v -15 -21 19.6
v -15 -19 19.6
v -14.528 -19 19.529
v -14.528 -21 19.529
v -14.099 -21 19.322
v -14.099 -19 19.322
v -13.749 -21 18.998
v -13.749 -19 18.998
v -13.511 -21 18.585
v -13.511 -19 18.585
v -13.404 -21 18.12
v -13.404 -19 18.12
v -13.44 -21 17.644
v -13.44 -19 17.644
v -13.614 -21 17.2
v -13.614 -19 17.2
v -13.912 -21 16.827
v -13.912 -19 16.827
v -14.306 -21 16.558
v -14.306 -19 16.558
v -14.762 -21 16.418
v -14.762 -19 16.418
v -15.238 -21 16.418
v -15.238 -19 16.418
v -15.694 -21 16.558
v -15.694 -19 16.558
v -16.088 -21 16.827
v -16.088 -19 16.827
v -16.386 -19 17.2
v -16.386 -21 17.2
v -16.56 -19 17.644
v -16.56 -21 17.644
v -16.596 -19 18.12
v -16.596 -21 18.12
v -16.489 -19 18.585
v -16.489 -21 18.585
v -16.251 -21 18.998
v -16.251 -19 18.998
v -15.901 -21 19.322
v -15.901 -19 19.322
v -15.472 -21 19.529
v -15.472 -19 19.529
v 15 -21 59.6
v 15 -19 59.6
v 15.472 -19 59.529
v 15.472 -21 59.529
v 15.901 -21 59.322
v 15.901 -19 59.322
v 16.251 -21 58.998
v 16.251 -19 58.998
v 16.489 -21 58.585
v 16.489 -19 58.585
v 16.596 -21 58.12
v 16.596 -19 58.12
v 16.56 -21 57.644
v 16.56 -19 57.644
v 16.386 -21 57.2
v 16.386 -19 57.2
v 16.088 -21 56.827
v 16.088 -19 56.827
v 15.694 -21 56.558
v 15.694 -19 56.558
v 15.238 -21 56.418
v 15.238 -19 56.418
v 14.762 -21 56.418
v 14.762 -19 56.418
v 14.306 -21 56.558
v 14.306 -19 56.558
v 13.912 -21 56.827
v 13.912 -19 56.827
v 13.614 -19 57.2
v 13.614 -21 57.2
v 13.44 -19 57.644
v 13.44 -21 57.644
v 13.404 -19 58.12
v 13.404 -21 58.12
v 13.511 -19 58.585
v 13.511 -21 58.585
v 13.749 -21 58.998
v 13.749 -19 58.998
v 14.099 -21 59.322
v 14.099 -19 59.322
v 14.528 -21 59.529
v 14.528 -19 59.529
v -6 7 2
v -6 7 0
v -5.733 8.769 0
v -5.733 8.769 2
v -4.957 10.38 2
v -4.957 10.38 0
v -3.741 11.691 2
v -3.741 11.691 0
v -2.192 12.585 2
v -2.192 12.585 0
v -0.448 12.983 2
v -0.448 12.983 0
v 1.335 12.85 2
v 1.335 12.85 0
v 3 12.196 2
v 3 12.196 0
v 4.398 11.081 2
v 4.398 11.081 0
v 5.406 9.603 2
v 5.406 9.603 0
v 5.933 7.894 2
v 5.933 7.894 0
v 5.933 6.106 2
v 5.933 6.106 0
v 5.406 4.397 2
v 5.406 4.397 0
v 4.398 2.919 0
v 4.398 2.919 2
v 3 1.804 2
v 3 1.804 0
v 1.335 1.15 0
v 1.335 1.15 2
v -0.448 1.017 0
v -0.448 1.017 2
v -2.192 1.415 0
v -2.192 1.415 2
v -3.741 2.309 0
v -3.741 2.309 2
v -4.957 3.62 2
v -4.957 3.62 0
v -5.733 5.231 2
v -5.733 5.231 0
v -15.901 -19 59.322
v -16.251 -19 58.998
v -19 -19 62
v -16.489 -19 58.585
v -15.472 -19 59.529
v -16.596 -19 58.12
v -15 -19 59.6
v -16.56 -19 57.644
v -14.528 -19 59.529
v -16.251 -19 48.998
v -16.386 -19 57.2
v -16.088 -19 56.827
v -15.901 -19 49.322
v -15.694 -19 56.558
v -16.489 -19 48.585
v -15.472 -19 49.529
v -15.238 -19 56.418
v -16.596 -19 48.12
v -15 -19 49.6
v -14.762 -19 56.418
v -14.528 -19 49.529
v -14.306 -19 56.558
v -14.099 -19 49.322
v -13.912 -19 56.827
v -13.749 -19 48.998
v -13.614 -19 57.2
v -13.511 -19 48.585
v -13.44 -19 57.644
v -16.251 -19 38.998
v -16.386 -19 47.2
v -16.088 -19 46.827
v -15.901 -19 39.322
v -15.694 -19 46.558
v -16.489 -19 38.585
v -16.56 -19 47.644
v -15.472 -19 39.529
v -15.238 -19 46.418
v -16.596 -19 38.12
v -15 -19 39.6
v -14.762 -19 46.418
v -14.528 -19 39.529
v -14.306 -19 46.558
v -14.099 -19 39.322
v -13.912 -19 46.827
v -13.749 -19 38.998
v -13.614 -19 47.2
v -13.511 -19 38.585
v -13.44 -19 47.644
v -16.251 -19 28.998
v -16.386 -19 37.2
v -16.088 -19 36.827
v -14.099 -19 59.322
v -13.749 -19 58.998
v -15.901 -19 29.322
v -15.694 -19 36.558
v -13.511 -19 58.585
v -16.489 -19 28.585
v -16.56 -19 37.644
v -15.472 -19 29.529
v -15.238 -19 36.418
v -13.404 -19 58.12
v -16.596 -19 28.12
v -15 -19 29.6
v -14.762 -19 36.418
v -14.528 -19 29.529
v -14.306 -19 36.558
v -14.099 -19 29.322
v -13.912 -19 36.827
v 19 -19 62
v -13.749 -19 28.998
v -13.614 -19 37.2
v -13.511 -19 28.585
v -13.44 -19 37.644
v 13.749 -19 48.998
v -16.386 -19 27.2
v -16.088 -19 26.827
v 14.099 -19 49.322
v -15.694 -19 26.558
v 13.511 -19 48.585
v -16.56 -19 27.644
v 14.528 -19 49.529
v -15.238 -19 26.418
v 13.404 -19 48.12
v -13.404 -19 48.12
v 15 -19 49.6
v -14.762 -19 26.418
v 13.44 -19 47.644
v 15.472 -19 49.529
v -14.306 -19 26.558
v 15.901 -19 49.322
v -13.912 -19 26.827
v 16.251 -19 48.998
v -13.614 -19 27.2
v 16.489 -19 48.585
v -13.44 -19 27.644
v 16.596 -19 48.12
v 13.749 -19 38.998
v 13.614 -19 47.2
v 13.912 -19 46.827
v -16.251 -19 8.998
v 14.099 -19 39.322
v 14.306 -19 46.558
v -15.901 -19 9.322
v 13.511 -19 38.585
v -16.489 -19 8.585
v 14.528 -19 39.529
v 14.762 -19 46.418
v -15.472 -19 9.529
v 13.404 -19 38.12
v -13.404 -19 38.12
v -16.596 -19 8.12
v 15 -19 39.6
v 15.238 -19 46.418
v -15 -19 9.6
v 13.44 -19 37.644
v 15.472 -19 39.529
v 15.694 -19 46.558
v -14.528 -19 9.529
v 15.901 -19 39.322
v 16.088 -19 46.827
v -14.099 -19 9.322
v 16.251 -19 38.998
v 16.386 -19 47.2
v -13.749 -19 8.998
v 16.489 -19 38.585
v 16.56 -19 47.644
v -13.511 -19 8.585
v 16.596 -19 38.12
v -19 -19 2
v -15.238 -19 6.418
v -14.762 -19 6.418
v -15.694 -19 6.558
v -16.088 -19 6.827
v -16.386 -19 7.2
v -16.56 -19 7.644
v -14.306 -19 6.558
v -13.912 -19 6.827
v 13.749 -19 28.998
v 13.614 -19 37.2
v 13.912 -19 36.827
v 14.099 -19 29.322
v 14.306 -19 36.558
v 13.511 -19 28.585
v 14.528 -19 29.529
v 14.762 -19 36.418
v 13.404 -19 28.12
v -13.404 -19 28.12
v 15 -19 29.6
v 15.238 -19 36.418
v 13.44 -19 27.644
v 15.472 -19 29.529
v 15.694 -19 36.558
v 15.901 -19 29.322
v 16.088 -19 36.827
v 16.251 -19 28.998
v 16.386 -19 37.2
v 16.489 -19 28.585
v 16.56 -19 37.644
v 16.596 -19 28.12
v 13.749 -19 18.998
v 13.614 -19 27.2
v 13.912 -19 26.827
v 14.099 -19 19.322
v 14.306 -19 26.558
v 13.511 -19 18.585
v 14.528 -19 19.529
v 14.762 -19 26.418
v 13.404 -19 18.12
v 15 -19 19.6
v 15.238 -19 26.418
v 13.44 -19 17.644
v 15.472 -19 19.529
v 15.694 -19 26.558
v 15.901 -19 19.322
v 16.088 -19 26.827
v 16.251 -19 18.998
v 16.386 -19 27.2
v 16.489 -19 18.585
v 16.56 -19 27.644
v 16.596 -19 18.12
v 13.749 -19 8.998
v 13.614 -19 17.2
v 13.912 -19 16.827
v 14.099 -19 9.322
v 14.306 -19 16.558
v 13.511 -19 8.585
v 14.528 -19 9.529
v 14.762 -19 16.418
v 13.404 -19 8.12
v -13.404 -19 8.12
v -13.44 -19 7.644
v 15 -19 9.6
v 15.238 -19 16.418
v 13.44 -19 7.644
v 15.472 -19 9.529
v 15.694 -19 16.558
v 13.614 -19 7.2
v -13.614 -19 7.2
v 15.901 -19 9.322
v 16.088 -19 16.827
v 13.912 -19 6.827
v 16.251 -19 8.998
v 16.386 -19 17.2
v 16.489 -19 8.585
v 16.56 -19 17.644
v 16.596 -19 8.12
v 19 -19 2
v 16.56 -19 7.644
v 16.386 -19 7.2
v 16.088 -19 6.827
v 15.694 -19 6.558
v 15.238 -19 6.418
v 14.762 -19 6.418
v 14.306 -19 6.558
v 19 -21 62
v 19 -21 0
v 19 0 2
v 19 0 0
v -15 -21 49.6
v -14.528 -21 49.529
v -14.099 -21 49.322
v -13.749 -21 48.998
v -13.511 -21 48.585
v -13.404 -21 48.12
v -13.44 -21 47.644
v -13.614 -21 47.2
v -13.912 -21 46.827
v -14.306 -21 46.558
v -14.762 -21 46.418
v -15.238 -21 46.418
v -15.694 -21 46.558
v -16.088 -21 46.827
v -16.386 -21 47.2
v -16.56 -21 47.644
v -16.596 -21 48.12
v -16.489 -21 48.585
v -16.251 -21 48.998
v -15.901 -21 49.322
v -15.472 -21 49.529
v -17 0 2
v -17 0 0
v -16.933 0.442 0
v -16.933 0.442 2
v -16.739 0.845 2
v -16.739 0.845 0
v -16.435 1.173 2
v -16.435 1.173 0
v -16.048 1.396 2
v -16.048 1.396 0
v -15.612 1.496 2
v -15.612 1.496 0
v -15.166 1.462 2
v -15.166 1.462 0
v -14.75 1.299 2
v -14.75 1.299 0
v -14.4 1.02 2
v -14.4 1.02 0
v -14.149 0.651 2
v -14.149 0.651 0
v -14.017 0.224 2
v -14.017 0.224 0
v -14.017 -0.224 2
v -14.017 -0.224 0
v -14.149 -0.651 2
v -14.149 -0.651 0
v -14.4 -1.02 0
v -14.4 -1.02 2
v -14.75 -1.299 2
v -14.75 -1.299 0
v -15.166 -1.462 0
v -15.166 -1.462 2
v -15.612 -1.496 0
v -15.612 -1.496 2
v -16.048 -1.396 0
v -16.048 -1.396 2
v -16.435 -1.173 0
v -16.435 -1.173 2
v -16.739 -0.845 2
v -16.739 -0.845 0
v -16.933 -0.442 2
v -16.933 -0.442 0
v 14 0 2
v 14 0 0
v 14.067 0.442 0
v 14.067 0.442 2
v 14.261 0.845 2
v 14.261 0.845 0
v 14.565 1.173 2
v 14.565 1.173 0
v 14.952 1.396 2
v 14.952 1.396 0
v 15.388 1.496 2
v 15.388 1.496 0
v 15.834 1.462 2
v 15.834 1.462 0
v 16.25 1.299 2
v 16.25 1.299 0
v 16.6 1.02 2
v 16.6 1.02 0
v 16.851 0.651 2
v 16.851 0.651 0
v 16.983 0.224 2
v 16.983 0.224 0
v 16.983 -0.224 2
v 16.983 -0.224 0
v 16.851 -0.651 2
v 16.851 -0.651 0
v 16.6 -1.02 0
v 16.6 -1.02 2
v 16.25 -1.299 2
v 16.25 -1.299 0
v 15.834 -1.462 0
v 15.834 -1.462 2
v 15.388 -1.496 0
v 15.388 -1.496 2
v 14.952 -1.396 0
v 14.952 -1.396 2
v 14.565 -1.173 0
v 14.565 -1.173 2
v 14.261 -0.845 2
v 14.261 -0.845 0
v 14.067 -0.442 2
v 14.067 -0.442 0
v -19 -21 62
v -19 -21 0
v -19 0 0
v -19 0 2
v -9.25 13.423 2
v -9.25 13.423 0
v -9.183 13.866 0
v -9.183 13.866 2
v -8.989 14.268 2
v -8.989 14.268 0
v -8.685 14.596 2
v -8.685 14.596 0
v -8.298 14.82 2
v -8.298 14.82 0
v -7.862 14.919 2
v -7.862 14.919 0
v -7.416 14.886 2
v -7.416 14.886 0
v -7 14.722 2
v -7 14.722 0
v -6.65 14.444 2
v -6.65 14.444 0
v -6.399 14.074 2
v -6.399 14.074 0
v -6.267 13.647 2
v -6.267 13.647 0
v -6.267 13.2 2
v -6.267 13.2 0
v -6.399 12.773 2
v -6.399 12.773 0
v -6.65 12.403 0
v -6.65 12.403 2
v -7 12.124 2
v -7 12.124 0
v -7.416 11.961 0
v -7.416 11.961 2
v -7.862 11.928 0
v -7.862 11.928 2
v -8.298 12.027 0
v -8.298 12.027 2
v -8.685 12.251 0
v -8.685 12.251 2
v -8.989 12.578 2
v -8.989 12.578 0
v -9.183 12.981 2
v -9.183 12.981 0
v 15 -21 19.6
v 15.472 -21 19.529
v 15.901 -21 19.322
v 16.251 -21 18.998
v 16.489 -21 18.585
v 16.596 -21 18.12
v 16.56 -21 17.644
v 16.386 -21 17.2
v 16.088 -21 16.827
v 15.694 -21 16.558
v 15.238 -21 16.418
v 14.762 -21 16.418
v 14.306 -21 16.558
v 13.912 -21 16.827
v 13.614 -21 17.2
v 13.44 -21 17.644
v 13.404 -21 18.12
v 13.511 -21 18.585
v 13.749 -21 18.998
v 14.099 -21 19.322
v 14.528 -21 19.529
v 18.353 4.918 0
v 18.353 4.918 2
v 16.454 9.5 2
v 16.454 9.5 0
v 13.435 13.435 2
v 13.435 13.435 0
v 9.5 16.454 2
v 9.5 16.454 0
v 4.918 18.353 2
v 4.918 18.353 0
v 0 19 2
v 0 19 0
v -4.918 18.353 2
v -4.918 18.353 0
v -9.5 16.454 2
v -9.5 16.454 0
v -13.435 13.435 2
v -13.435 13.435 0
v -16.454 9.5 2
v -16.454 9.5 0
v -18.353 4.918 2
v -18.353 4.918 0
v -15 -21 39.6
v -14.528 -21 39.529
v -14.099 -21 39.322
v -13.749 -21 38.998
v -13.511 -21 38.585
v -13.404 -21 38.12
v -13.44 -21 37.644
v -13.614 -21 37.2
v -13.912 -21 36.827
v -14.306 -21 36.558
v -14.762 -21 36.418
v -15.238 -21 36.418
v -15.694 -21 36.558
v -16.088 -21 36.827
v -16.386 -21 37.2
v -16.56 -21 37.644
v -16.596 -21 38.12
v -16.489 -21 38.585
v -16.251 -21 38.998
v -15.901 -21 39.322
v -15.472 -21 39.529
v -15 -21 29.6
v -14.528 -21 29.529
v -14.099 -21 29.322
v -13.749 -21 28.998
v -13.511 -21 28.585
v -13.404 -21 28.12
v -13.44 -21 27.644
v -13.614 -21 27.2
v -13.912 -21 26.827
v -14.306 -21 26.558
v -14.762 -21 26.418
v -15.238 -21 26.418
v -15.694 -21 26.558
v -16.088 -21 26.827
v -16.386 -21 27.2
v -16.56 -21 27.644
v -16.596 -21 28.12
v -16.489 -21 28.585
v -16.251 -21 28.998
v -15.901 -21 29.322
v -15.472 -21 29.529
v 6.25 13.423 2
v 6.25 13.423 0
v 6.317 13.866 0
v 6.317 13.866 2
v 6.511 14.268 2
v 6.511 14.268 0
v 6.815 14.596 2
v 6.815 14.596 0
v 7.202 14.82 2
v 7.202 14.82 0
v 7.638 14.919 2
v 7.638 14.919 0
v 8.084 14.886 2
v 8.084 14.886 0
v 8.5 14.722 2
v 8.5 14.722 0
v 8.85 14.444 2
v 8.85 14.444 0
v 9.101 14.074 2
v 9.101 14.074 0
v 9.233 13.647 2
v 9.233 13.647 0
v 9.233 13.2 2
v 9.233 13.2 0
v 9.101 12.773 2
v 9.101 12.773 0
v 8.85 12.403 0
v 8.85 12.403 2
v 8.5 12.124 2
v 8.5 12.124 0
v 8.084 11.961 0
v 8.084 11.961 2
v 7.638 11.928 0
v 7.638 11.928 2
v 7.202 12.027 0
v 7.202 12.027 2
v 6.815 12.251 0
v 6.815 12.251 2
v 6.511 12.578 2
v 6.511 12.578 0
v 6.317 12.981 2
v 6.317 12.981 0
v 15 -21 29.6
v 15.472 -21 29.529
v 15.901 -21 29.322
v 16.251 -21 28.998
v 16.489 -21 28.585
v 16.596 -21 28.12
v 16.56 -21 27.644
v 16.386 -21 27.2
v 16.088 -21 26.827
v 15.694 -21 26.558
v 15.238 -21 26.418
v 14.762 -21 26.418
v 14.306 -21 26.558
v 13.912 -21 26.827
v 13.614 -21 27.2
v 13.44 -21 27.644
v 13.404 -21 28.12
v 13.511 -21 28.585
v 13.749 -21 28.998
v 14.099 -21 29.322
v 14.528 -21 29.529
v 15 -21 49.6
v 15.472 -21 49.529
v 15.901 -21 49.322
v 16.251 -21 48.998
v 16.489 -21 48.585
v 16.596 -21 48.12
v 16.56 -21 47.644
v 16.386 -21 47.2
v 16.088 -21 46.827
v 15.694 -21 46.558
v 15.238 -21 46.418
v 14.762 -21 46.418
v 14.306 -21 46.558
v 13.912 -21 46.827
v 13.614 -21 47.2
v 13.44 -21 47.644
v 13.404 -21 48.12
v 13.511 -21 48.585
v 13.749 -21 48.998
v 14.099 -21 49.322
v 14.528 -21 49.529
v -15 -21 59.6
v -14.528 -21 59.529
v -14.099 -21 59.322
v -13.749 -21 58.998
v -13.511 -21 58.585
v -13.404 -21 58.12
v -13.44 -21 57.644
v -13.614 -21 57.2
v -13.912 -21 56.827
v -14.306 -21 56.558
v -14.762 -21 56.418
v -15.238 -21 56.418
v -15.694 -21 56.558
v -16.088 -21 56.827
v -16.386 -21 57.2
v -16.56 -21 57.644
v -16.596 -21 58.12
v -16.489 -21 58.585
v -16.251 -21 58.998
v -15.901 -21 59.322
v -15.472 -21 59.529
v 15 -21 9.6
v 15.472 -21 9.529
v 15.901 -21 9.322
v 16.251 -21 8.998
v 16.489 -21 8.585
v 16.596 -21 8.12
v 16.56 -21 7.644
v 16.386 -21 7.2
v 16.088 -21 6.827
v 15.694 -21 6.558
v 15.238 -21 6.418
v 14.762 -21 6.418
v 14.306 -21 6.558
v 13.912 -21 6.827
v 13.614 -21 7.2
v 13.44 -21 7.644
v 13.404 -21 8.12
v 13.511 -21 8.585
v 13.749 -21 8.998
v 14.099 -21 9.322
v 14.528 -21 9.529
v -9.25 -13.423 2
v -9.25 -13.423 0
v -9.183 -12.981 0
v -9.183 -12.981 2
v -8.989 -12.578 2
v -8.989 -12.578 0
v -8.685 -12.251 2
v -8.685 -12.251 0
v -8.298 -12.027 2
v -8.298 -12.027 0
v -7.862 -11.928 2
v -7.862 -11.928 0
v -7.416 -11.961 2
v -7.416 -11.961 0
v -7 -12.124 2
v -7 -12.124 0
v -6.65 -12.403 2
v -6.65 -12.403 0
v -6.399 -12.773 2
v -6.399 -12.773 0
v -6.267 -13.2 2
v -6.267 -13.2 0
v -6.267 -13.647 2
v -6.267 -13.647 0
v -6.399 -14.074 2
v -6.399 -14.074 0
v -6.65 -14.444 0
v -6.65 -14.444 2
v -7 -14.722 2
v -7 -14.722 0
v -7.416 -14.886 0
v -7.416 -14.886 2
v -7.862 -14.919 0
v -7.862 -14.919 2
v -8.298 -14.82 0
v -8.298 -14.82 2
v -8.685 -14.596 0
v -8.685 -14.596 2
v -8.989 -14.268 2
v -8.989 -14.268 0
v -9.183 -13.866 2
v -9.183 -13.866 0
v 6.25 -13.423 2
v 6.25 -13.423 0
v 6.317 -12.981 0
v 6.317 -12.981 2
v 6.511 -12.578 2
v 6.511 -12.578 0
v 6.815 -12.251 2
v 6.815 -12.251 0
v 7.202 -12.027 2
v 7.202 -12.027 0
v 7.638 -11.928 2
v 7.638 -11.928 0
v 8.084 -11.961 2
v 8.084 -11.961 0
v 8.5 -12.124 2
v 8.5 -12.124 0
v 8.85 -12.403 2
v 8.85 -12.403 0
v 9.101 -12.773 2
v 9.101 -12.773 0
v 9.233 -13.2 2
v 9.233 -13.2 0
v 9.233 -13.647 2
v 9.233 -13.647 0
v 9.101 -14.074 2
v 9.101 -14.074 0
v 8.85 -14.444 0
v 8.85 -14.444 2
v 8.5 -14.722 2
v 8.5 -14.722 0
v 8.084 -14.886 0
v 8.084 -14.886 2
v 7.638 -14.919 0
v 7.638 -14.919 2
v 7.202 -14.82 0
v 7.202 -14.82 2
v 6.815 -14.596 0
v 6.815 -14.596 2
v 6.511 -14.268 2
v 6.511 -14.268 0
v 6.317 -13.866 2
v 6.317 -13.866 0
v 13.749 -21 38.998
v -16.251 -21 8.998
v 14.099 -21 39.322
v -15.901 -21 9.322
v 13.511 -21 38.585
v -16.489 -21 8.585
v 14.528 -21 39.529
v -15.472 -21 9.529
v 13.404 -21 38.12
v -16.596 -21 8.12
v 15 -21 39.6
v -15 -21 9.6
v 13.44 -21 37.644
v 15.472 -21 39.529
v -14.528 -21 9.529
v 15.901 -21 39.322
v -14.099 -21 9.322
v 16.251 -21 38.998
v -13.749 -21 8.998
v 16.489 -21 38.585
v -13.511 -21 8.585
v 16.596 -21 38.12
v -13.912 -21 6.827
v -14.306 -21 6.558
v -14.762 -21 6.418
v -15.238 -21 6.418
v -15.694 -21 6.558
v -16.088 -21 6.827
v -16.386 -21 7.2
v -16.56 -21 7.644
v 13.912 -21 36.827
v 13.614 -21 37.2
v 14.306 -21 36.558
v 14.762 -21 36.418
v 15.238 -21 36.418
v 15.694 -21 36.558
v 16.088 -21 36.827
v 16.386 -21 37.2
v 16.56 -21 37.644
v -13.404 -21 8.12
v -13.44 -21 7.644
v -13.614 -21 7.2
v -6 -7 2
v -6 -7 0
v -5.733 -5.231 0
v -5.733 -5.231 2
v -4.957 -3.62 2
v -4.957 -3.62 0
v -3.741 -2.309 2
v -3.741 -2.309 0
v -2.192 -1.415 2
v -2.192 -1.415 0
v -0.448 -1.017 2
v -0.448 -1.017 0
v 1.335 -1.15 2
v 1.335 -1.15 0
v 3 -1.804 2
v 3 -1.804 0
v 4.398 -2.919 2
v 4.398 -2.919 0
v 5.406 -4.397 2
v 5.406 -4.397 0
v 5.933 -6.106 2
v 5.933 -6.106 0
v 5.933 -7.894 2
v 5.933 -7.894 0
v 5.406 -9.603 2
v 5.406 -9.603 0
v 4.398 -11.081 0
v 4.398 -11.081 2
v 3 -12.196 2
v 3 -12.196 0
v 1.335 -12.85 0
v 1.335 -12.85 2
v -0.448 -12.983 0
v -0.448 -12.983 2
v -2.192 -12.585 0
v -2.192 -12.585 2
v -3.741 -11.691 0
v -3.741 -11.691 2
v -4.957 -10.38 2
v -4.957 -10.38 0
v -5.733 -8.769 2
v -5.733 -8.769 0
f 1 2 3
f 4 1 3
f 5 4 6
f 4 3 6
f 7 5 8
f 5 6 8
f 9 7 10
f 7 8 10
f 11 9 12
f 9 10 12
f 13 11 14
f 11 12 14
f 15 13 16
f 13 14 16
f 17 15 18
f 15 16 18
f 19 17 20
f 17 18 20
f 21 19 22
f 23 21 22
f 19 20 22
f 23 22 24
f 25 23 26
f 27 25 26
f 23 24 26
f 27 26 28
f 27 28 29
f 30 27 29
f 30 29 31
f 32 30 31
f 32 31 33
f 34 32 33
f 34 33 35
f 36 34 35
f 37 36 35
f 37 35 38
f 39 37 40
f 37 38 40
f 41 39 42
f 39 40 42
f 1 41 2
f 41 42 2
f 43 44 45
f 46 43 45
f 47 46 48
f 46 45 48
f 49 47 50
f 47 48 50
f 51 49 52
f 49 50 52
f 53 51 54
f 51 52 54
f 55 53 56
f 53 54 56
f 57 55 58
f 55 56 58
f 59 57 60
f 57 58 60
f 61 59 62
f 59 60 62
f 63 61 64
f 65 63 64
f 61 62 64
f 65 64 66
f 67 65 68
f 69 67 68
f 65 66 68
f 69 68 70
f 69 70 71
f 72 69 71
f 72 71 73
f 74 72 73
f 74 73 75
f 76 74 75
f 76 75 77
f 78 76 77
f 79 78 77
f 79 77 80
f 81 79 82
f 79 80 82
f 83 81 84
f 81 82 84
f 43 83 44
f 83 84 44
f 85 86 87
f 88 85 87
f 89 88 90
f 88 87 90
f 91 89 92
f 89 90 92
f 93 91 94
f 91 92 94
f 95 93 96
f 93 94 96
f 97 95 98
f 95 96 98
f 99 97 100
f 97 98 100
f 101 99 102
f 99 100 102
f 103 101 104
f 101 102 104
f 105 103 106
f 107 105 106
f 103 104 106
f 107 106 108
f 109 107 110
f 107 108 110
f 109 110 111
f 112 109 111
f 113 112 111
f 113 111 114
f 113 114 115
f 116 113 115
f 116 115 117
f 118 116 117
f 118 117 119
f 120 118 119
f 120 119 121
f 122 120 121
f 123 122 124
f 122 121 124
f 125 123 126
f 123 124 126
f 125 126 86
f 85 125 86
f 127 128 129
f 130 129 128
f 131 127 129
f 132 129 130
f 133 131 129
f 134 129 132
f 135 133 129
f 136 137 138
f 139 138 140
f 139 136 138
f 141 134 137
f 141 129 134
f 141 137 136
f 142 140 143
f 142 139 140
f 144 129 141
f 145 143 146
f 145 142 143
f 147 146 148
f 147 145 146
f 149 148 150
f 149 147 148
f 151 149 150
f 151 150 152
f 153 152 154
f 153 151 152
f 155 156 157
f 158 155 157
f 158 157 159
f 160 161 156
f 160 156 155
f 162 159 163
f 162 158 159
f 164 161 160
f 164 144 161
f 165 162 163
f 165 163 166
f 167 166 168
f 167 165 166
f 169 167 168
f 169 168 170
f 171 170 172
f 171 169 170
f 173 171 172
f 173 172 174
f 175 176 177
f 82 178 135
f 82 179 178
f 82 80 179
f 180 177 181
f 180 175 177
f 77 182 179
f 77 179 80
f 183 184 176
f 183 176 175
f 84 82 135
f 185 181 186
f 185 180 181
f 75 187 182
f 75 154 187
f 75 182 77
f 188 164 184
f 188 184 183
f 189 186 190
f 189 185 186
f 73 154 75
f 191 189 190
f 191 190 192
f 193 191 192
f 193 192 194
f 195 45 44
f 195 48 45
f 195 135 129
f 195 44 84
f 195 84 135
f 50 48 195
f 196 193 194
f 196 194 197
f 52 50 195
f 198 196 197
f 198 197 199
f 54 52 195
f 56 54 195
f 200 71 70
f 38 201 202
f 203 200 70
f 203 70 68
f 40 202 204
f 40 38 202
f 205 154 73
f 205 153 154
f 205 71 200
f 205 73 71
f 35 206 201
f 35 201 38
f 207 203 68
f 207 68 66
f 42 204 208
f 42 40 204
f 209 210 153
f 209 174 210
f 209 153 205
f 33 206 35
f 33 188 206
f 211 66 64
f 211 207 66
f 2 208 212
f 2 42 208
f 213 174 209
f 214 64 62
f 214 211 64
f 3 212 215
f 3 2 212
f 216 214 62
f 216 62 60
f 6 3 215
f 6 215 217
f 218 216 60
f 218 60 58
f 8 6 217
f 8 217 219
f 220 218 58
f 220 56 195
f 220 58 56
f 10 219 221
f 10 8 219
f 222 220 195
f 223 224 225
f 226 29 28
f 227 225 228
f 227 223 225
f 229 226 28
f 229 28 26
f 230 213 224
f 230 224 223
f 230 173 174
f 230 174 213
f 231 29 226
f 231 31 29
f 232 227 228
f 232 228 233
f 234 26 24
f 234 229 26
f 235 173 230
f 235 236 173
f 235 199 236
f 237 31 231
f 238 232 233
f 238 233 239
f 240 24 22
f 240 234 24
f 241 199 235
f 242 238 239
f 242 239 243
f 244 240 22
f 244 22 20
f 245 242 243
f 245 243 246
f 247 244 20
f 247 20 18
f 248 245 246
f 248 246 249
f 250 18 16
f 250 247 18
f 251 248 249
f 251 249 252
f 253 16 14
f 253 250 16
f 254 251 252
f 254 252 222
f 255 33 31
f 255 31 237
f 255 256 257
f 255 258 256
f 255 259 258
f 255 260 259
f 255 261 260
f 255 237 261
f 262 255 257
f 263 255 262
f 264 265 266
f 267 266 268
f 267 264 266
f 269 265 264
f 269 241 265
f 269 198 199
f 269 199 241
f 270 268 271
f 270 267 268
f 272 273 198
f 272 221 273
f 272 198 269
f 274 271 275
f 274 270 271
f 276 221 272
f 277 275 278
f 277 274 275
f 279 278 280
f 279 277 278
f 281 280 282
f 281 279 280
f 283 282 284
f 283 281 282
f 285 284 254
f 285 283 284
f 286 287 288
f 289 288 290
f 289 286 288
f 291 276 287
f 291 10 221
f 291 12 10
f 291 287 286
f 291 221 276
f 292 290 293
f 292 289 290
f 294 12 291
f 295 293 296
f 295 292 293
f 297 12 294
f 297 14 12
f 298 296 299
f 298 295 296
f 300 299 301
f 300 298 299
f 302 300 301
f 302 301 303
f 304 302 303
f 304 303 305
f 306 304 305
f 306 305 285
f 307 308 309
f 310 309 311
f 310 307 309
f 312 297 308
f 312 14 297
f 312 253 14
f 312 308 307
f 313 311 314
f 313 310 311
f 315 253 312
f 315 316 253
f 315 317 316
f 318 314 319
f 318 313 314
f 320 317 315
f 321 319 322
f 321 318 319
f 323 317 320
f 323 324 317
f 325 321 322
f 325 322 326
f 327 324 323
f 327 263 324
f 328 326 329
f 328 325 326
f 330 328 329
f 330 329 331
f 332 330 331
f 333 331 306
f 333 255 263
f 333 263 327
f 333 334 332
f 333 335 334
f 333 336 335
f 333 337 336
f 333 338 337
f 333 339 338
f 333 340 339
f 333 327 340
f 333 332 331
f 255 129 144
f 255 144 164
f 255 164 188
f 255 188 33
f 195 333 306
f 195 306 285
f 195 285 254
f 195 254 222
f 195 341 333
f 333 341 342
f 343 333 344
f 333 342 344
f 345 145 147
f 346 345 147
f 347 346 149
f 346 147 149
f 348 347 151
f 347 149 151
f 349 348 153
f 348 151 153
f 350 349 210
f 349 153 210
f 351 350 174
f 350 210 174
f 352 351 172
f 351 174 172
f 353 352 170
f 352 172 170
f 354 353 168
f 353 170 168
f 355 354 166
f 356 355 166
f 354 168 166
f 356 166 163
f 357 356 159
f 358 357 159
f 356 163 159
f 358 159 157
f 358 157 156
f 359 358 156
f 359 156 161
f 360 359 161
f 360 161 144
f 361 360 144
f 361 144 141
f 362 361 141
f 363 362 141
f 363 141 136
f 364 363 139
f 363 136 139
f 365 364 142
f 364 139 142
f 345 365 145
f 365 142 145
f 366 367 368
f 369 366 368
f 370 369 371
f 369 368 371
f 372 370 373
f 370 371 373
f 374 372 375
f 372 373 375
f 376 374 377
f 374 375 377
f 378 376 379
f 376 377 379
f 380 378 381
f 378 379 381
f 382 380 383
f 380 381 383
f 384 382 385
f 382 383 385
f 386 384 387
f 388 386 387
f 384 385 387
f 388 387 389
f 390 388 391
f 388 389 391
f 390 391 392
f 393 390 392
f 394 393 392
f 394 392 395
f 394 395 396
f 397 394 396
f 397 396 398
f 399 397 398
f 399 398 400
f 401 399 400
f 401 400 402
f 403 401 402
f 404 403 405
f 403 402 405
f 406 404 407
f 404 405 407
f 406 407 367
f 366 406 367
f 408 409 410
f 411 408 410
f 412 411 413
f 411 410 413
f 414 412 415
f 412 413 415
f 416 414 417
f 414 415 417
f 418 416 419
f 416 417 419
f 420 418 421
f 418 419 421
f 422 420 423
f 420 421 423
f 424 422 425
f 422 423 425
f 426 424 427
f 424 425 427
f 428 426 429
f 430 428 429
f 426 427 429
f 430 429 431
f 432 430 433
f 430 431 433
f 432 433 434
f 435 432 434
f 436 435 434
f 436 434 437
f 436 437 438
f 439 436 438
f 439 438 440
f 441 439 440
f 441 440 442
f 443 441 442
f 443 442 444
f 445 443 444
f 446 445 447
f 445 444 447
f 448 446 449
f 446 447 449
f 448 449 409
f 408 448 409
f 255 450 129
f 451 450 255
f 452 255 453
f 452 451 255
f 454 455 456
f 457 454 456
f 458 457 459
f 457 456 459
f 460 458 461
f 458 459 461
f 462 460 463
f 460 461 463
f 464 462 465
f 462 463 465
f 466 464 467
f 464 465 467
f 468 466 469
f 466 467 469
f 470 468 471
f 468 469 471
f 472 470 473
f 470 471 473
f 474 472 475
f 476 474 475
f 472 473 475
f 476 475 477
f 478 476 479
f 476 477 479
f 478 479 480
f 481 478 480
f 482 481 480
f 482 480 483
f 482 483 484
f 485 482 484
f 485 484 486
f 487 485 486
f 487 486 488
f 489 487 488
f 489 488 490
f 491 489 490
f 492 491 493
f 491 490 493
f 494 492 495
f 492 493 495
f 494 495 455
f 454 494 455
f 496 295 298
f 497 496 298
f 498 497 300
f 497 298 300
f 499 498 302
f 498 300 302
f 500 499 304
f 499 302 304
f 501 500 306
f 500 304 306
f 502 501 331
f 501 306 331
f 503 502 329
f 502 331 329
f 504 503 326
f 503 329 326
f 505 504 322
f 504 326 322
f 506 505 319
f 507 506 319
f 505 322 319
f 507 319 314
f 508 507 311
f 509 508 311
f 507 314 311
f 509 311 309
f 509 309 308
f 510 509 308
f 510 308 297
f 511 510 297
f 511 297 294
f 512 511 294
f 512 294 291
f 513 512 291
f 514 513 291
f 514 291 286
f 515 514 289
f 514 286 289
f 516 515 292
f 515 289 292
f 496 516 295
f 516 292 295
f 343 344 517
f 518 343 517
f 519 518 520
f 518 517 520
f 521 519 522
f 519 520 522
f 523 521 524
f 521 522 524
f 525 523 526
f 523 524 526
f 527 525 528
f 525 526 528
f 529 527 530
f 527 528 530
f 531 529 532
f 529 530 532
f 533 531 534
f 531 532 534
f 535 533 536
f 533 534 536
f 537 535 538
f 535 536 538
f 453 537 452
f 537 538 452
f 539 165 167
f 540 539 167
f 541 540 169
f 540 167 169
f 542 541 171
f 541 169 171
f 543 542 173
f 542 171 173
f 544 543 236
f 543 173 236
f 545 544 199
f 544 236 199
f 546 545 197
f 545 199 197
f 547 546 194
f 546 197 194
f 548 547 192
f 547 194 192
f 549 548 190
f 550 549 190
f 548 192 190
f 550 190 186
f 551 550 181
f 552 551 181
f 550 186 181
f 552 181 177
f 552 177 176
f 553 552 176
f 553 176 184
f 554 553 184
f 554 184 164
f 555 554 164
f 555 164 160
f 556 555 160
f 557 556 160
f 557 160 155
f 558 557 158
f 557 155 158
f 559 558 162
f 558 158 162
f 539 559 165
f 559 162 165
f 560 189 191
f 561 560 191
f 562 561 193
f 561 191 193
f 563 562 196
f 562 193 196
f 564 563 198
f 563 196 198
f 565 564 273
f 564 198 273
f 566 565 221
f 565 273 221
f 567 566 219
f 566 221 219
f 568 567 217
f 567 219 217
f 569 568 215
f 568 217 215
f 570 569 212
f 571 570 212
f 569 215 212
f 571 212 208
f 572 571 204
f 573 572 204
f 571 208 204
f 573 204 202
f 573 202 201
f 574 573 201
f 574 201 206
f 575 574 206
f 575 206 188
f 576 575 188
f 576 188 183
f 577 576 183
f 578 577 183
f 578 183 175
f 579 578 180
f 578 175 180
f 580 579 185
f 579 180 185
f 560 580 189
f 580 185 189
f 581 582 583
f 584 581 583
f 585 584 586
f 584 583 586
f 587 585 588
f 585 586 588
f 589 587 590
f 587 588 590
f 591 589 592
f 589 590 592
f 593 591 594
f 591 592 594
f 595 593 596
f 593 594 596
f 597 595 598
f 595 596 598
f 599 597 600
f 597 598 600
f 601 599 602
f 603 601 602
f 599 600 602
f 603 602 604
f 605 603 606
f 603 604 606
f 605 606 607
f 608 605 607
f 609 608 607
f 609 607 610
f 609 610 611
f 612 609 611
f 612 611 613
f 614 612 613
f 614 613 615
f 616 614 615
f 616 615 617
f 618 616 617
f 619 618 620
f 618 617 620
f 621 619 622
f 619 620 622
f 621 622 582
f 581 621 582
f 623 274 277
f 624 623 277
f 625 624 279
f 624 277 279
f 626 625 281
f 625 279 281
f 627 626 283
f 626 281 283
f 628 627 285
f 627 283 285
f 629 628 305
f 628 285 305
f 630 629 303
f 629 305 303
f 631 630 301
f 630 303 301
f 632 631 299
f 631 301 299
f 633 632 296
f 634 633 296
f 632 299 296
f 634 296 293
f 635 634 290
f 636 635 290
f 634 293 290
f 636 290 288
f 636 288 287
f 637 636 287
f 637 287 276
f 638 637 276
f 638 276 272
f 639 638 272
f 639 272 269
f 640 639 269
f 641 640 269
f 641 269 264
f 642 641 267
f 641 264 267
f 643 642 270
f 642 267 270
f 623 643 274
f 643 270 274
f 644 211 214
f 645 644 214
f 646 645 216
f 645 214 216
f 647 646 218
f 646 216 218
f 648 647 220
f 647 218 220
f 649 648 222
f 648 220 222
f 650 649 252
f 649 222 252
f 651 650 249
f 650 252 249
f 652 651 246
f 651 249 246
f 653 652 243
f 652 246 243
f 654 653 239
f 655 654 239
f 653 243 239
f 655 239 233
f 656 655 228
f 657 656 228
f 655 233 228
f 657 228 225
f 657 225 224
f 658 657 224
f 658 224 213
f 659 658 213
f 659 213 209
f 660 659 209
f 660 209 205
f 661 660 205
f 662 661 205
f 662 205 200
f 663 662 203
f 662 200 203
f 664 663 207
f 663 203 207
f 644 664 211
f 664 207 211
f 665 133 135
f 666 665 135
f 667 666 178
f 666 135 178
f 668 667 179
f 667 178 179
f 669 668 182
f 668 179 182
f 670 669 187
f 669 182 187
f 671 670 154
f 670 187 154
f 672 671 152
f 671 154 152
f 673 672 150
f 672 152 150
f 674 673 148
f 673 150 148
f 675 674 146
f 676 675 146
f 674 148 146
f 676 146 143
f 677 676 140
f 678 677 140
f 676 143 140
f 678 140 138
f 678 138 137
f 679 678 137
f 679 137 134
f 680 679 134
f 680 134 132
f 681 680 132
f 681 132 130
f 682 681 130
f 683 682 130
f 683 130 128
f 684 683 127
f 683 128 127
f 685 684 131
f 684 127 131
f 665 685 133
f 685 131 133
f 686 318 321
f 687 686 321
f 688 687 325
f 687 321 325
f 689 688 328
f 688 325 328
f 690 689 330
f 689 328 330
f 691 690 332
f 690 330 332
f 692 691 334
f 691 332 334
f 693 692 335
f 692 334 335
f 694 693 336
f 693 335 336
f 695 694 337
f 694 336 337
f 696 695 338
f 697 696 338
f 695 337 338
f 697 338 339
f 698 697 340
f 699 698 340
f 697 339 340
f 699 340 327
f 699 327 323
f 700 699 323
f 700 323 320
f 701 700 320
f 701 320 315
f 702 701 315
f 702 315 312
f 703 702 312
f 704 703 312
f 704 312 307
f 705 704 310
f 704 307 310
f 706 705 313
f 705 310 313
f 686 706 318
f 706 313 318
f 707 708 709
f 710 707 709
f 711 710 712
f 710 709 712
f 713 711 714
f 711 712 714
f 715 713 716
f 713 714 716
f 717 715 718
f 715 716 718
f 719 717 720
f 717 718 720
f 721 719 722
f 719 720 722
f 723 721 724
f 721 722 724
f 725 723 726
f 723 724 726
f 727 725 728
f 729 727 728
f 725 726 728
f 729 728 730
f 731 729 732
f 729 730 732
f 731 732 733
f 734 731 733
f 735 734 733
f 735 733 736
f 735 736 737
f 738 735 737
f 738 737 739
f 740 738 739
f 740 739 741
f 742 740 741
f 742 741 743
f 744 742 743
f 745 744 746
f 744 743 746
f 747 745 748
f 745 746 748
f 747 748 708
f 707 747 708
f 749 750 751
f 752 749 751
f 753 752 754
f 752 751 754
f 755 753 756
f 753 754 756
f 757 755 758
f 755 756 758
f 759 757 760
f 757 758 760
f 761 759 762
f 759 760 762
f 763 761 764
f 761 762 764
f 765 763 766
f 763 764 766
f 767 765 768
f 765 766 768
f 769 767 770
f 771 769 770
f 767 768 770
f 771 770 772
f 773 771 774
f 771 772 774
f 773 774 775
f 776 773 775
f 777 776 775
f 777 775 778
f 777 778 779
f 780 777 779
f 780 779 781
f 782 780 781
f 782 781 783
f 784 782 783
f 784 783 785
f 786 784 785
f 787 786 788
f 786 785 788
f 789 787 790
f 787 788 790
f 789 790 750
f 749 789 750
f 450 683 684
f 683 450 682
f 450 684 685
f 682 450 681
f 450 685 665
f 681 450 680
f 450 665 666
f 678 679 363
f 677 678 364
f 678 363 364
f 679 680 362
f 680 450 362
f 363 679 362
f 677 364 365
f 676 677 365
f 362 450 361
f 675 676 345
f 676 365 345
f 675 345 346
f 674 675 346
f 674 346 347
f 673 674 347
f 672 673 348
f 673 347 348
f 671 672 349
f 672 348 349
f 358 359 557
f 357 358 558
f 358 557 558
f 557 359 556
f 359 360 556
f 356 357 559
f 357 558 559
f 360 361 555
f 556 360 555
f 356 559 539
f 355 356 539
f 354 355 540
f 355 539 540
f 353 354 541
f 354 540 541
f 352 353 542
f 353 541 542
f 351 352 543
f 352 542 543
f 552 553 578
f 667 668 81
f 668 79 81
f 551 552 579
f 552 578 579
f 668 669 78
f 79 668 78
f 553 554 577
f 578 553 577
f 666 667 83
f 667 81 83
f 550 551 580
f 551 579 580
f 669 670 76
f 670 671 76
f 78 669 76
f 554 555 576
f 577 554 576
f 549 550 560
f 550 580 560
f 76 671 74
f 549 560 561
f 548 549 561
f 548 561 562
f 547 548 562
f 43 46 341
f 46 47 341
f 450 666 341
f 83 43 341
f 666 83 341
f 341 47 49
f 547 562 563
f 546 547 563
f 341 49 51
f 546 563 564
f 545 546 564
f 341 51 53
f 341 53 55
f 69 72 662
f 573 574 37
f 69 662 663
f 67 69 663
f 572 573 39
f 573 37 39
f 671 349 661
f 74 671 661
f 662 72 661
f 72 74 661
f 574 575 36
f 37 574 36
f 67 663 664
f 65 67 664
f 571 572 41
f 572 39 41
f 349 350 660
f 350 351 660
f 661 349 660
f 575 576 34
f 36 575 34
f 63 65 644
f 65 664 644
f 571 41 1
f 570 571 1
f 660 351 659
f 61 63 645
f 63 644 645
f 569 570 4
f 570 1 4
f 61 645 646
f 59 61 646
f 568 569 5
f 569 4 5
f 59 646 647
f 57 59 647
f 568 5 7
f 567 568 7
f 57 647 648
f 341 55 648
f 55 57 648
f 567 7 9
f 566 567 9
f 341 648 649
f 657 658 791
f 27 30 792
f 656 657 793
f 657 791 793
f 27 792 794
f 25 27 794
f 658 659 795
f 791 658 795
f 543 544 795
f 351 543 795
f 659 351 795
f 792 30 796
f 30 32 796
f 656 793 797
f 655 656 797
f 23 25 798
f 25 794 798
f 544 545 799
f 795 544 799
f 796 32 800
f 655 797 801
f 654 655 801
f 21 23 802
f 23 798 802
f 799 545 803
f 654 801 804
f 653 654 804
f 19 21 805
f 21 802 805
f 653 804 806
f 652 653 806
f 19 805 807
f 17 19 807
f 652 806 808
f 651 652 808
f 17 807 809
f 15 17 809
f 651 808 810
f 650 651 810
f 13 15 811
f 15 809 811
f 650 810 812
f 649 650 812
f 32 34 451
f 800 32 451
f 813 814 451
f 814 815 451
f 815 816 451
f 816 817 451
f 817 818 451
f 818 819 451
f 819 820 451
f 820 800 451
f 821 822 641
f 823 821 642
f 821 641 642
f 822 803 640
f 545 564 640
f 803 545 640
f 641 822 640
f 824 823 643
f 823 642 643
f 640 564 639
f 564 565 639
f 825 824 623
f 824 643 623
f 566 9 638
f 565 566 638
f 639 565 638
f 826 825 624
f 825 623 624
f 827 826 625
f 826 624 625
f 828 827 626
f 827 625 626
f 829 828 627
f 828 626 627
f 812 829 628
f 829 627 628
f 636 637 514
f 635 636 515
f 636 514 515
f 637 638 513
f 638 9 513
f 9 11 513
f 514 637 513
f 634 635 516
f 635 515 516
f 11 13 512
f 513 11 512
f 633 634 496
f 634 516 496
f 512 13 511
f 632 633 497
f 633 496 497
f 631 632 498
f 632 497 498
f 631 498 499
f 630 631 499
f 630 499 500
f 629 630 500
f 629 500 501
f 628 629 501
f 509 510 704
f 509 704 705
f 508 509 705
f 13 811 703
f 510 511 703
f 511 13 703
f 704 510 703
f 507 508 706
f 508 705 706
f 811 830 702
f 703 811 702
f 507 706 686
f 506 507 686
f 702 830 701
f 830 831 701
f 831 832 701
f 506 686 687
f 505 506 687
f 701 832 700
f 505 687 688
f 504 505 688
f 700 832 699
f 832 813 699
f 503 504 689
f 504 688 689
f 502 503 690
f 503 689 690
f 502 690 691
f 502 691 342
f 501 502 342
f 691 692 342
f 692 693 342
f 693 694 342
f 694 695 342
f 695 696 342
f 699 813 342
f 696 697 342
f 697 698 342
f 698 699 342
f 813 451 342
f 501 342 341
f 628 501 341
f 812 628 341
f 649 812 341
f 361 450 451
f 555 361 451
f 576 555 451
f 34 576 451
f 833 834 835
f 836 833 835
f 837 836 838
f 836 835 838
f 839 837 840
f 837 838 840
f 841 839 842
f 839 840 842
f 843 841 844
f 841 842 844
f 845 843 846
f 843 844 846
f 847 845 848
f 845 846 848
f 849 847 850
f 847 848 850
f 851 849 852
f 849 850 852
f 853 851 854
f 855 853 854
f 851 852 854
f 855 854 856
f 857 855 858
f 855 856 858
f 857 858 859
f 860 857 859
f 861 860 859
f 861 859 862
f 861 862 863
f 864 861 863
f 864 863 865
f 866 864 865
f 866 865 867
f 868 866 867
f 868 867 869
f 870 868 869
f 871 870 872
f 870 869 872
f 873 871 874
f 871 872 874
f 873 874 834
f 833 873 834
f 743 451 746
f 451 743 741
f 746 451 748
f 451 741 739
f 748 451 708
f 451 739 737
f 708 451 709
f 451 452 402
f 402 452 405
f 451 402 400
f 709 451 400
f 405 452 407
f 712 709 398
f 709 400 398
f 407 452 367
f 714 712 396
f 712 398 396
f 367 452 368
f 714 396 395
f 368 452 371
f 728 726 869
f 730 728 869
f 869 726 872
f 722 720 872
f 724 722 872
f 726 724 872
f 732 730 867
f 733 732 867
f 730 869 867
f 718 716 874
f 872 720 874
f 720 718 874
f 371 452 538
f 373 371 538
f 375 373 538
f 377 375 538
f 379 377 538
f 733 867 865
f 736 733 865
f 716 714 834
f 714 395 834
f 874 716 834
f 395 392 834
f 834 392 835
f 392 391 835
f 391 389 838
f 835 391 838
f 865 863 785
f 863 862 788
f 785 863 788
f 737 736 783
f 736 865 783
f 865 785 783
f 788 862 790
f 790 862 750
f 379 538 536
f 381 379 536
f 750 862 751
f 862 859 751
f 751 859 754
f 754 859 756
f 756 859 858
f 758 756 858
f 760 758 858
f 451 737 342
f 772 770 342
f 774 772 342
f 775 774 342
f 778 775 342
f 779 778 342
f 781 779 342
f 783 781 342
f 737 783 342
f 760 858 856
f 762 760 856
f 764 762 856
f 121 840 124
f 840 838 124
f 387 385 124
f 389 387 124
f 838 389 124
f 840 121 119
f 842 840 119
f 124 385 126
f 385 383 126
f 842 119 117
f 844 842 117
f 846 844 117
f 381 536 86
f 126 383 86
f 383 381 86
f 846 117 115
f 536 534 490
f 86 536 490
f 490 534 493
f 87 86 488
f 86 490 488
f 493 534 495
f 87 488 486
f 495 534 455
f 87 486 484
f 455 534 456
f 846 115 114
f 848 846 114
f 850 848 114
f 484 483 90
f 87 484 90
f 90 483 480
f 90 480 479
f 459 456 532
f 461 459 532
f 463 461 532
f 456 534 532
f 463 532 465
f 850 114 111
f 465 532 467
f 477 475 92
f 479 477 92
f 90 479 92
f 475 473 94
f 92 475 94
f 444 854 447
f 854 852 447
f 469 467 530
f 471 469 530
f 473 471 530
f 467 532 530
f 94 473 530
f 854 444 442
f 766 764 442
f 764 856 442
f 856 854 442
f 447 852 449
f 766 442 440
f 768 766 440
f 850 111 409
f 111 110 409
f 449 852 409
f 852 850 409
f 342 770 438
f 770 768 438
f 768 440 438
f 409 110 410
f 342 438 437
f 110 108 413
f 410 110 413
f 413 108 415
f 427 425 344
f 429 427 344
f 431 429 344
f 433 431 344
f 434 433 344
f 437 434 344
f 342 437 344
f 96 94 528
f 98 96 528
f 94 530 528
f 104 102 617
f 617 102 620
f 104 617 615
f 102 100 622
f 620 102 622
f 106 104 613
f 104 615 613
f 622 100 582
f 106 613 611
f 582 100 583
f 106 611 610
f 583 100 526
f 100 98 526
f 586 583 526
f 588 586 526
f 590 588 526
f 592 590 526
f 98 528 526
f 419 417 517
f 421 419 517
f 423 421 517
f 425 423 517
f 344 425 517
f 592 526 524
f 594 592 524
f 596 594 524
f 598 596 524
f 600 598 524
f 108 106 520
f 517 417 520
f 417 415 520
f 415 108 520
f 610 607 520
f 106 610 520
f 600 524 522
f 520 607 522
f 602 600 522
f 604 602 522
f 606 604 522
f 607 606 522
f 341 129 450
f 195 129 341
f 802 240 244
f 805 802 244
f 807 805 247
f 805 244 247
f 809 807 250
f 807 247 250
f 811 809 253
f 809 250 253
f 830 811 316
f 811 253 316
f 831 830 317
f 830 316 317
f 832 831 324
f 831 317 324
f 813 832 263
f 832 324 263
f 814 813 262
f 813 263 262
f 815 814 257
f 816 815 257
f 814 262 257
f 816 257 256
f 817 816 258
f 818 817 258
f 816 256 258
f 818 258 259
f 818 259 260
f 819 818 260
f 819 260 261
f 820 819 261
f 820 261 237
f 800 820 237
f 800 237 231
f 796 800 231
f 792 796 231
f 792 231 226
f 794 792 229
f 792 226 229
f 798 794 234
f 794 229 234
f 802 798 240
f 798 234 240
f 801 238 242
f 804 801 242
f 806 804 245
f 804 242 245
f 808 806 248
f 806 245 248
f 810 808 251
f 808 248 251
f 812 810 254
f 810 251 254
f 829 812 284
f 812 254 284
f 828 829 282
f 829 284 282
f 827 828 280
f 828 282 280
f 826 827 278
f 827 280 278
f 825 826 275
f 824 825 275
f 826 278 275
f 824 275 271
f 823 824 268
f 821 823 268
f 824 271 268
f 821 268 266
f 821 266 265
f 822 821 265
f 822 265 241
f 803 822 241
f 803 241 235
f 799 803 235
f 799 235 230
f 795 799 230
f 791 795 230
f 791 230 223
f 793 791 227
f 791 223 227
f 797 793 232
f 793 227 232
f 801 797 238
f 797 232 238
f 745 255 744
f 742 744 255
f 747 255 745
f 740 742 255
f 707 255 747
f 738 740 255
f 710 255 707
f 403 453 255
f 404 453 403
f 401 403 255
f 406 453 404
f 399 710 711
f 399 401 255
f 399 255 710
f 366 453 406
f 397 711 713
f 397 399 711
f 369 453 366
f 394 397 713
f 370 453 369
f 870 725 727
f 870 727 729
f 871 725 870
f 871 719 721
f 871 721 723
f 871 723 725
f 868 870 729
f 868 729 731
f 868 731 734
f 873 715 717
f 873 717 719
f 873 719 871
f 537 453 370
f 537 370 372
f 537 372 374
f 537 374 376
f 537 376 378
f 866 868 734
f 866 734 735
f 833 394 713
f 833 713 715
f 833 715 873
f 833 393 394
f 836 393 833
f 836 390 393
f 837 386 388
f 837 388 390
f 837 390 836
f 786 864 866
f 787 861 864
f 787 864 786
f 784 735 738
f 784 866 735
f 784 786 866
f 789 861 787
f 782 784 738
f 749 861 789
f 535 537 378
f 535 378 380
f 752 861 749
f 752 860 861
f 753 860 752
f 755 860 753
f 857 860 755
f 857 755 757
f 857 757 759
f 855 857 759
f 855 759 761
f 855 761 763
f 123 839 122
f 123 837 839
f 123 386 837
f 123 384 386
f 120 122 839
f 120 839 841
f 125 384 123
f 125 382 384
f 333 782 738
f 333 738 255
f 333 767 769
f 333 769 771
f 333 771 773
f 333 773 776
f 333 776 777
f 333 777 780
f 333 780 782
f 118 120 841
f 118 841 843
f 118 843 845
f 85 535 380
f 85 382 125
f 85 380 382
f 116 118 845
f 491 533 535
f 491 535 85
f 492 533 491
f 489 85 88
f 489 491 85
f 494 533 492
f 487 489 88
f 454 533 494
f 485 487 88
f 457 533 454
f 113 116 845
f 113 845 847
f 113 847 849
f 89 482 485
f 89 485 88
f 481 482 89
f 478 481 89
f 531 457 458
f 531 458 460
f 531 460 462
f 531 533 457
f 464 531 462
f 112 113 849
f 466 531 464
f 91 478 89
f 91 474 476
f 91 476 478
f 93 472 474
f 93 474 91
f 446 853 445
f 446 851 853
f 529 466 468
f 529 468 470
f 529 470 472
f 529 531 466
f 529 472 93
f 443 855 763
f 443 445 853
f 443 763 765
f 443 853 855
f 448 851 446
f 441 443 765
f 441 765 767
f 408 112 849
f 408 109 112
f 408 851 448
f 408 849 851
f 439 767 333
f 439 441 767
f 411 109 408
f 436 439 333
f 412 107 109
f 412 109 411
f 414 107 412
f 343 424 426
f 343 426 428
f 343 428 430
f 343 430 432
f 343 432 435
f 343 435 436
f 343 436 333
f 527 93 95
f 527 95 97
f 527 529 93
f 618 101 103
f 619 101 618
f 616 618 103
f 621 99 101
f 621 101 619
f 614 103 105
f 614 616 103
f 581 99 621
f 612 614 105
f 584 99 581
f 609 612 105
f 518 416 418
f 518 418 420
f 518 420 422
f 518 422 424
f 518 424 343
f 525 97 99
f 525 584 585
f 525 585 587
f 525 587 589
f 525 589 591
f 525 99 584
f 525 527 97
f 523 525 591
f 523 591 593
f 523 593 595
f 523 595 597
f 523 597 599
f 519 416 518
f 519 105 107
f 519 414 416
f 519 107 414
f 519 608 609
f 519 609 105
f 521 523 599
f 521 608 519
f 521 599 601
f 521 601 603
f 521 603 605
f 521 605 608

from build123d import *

# Parameters (mm, degrees)
EXTRUDE_1_DEPTH     = 2
SKETCH_2_W          = 38
SKETCH_2_H          = 2
EXTRUDE_2_DEPTH     = 60
SKETCH_3_R          = 1.6
CUT_EXTRUDE_1_DEPTH = 2
SKETCH_4_R          = 6
SKETCH_4_R_2        = 1.5
CUT_EXTRUDE_3_DEPTH = 2


with BuildPart() as part:
    # ｽｹｯﾁ1 → ﾎﾞｽ - 押し出し1 (new body)
    with BuildSketch(Plane.XY):
        with BuildLine():
            Line((-19, 0), (-19, -21))
            Line((-19, -21), (19, -21))
            Line((19, -21), (19, 0))
            ThreePointArc((19, 0), (0, 19), (-19, 0))
        make_face()
    extrude(amount=EXTRUDE_1_DEPTH)

    # ｽｹｯﾁ2 → ﾎﾞｽ - 押し出し2 (add)
    with BuildSketch(Plane.XY.offset(2)):
        with Locations((0, -20)):
            Rectangle(SKETCH_2_W, SKETCH_2_H)
    extrude(amount=EXTRUDE_2_DEPTH)

    # ｽｹｯﾁ3 → ｶｯﾄ - 押し出し1 (cut)
    with BuildSketch(Plane(origin=(0, -19, 0), x_dir=(1, 0, 0), z_dir=(0, 1, 0))):
        with Locations(Location((-15, -8, 0), (0, 0, 270))):  # turned: the seam where the file's is
            Circle(SKETCH_3_R)
        with Locations(Location((-15, -18, 0), (0, 0, 270))):  # turned: the seam where the file's is
            Circle(SKETCH_3_R)
        with Locations(Location((-15, -38, 0), (0, 0, 270))):  # turned: the seam where the file's is
            Circle(SKETCH_3_R)
        with Locations(Location((-15, -28, 0), (0, 0, 270))):  # turned: the seam where the file's is
            Circle(SKETCH_3_R)
        with Locations(Location((-15, -48, 0), (0, 0, 270))):  # turned: the seam where the file's is
            Circle(SKETCH_3_R)
        with Locations(Location((15, -8, 0), (0, 0, 270))):  # turned: the seam where the file's is
            Circle(SKETCH_3_R)
        with Locations(Location((15, -18, 0), (0, 0, 270))):  # turned: the seam where the file's is
            Circle(SKETCH_3_R)
        with Locations(Location((15, -28, 0), (0, 0, 270))):  # turned: the seam where the file's is
            Circle(SKETCH_3_R)
        with Locations(Location((15, -38, 0), (0, 0, 270))):  # turned: the seam where the file's is
            Circle(SKETCH_3_R)
        with Locations(Location((15, -48, 0), (0, 0, 270))):  # turned: the seam where the file's is
            Circle(SKETCH_3_R)
        with Locations(Location((-15, -58, 0), (0, 0, 270))):  # turned: the seam where the file's is
            Circle(SKETCH_3_R)
        with Locations(Location((15, -58, 0), (0, 0, 270))):  # turned: the seam where the file's is
            Circle(SKETCH_3_R)
    extrude(amount=-CUT_EXTRUDE_1_DEPTH, mode=Mode.SUBTRACT)

    # ｽｹｯﾁ4 → ｶｯﾄ - 押し出し3 (cut)
    with BuildSketch(Plane(origin=(0, 0, 0), x_dir=(-1, 0, 0), z_dir=(0, 0, -1))):
        with Locations((0, 7)):
            Circle(SKETCH_4_R)
        with Locations((0, -7)):
            Circle(SKETCH_4_R)
        with Locations((-7.75, 13.423393759)):
            Circle(SKETCH_4_R_2)
        with Locations((-15.5, 0)):
            Circle(SKETCH_4_R_2)
        with Locations((15.5, 0)):
            Circle(SKETCH_4_R_2)
        with Locations((7.75, 13.423393759)):
            Circle(SKETCH_4_R_2)
        with Locations((7.75, -13.423393759)):
            Circle(SKETCH_4_R_2)
        with Locations((-7.75, -13.423393759)):
            Circle(SKETCH_4_R_2)
    extrude(amount=-CUT_EXTRUDE_3_DEPTH, mode=Mode.SUBTRACT)


solid = part.part
